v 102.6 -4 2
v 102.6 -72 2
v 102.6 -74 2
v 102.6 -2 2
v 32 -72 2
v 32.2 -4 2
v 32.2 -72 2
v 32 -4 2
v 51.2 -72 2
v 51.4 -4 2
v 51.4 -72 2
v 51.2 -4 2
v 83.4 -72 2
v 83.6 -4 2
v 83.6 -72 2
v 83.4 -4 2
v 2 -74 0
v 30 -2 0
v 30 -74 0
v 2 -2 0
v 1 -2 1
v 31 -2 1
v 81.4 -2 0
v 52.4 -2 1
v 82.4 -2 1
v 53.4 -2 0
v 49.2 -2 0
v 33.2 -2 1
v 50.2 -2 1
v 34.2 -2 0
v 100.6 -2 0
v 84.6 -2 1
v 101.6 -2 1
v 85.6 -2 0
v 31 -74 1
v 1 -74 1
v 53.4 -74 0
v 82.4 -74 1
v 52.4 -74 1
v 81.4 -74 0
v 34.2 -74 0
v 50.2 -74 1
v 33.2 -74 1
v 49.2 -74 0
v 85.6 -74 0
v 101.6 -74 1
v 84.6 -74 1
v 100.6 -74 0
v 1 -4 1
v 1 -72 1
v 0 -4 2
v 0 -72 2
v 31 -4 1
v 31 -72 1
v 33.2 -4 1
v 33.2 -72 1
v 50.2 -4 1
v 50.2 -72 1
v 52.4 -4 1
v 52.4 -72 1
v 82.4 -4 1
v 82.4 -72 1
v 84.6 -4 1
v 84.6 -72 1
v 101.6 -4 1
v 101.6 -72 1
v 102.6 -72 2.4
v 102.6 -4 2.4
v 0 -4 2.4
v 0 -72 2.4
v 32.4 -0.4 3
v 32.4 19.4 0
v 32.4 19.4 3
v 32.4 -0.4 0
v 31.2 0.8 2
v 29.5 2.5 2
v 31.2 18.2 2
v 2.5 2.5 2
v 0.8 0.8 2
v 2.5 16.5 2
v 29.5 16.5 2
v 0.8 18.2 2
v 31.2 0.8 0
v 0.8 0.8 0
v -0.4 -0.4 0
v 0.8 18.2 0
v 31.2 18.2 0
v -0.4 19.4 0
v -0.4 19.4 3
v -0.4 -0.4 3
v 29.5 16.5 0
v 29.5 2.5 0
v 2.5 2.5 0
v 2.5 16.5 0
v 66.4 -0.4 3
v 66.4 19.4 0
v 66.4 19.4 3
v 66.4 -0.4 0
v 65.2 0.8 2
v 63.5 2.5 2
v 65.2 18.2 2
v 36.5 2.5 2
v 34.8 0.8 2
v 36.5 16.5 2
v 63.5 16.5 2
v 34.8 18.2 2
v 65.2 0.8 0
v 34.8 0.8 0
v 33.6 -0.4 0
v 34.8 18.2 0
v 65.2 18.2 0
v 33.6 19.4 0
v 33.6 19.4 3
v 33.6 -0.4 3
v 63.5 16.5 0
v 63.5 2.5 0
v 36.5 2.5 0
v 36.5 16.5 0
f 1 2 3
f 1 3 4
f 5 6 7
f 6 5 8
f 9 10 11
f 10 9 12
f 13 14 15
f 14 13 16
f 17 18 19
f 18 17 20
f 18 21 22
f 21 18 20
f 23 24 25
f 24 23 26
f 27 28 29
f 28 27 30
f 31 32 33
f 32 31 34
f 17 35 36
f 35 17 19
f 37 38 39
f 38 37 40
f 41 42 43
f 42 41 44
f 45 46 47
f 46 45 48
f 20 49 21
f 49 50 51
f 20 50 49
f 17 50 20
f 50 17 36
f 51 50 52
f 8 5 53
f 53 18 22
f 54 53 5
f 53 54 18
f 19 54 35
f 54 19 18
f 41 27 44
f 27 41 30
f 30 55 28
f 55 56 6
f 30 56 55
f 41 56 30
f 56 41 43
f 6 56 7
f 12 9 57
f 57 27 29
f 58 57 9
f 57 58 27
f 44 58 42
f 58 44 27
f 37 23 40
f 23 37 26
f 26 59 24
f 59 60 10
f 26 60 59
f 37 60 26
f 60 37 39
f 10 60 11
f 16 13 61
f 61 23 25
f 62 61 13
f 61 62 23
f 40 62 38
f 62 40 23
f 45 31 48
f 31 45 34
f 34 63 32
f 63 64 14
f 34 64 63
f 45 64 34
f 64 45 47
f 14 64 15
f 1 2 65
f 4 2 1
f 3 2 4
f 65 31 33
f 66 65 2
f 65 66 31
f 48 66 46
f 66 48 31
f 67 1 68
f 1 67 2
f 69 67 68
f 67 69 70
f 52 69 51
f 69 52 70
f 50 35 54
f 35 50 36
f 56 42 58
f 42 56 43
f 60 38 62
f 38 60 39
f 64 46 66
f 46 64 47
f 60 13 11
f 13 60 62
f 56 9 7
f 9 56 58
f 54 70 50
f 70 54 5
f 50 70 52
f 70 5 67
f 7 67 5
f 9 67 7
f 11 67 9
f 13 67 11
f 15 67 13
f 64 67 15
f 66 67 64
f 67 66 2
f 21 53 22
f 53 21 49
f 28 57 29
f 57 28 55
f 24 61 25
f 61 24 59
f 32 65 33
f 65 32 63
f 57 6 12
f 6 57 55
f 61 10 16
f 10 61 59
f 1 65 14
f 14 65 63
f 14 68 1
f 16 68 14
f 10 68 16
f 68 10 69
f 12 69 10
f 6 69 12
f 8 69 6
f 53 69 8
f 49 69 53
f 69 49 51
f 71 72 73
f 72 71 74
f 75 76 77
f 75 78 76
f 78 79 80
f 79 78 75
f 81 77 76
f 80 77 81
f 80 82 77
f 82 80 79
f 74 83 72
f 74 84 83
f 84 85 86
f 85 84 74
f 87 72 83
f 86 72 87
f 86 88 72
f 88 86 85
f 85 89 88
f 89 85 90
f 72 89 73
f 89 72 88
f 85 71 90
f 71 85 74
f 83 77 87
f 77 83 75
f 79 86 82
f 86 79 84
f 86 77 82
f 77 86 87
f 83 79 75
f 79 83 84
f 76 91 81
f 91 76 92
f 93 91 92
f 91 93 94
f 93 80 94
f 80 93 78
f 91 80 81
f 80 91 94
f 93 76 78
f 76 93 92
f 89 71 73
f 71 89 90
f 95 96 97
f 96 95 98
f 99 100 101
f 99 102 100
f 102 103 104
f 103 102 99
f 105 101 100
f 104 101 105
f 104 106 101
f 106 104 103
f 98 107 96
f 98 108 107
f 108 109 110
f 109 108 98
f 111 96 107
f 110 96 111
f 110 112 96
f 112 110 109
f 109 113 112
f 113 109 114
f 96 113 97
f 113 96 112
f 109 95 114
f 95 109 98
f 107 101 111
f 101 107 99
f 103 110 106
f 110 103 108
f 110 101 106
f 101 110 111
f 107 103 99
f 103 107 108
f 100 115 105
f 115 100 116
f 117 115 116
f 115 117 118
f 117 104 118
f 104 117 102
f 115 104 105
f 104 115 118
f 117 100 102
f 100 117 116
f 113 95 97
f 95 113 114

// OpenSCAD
//pi zero
inner_width=28;
inner_length=15;
inner_height=70;

thickness = 2;
cover_thickness = 1;
skin = 0.4;
cover_overlap=2;

length = inner_length+thickness*2;
width = inner_width+thickness*2;
height = inner_height+cover_overlap;
overall_length = length*2+width*2+skin/2*3;

module wedge(_length) {
    rotate([90,0,0])
    linear_extrude(_length)
        polygon([ 
                    [0, 0], 
                    [thickness, 0], 
                    [thickness, thickness] ]);
}

module side(_width) {
    difference() {
        cube([_width,height,thickness]);
        translate([thickness,0,0]) {
            rotate([0,0,180]) {
                wedge(height);
            }
        }
        translate([_width-thickness,height,0]) {
            wedge(height);
        }
    }
}
module sides() {
    translate([0,0,0]) {
        side(width);
    }
    translate([width+skin/2,0,0]) {
        side(length);
    }
    translate([   width  + skin/2
                + length + skin/2,0,0]) {
        side(width);
    }
    translate([   width  + skin/2
                + length + skin/2
                + width  + skin/2,0,0]) {
        side(length);
    }
}
module sides_with_skin() {
    sides();
        translate([0,0,thickness])
            cube([overall_length,height,skin]);
}
module box() {
    difference() {
        sides_with_skin();
        
        translate([0,0,thickness/2])
            cube([overall_length,cover_overlap,thickness/2+skin]);
        translate([0,height-cover_overlap,thickness/2])
            cube([overall_length,cover_overlap,thickness/2+skin]);
    }
}
module lid() {
    translate([width/2,length/2,0]) {
        union() {
            translate([0,0,cover_overlap/2]) {
            difference() {
                cube([width+skin*2,length+skin*2,cover_overlap], center = true);
                cube([width-thickness+0.4,length-thickness+0.4,cover_overlap], center = true);
            }
            cube([width-thickness*2-1,length-thickness*2-1,cover_overlap], center = true);
        }
            translate([0,0,cover_overlap+cover_thickness/2]) {
            cube([width+skin*2,length+skin*2,cover_thickness], center = true);
            }
        }
    }
}
translate([0,-height-2,0]) {
    box();
}
translate([width+2,0,0]) {
    lid();
}
lid();
